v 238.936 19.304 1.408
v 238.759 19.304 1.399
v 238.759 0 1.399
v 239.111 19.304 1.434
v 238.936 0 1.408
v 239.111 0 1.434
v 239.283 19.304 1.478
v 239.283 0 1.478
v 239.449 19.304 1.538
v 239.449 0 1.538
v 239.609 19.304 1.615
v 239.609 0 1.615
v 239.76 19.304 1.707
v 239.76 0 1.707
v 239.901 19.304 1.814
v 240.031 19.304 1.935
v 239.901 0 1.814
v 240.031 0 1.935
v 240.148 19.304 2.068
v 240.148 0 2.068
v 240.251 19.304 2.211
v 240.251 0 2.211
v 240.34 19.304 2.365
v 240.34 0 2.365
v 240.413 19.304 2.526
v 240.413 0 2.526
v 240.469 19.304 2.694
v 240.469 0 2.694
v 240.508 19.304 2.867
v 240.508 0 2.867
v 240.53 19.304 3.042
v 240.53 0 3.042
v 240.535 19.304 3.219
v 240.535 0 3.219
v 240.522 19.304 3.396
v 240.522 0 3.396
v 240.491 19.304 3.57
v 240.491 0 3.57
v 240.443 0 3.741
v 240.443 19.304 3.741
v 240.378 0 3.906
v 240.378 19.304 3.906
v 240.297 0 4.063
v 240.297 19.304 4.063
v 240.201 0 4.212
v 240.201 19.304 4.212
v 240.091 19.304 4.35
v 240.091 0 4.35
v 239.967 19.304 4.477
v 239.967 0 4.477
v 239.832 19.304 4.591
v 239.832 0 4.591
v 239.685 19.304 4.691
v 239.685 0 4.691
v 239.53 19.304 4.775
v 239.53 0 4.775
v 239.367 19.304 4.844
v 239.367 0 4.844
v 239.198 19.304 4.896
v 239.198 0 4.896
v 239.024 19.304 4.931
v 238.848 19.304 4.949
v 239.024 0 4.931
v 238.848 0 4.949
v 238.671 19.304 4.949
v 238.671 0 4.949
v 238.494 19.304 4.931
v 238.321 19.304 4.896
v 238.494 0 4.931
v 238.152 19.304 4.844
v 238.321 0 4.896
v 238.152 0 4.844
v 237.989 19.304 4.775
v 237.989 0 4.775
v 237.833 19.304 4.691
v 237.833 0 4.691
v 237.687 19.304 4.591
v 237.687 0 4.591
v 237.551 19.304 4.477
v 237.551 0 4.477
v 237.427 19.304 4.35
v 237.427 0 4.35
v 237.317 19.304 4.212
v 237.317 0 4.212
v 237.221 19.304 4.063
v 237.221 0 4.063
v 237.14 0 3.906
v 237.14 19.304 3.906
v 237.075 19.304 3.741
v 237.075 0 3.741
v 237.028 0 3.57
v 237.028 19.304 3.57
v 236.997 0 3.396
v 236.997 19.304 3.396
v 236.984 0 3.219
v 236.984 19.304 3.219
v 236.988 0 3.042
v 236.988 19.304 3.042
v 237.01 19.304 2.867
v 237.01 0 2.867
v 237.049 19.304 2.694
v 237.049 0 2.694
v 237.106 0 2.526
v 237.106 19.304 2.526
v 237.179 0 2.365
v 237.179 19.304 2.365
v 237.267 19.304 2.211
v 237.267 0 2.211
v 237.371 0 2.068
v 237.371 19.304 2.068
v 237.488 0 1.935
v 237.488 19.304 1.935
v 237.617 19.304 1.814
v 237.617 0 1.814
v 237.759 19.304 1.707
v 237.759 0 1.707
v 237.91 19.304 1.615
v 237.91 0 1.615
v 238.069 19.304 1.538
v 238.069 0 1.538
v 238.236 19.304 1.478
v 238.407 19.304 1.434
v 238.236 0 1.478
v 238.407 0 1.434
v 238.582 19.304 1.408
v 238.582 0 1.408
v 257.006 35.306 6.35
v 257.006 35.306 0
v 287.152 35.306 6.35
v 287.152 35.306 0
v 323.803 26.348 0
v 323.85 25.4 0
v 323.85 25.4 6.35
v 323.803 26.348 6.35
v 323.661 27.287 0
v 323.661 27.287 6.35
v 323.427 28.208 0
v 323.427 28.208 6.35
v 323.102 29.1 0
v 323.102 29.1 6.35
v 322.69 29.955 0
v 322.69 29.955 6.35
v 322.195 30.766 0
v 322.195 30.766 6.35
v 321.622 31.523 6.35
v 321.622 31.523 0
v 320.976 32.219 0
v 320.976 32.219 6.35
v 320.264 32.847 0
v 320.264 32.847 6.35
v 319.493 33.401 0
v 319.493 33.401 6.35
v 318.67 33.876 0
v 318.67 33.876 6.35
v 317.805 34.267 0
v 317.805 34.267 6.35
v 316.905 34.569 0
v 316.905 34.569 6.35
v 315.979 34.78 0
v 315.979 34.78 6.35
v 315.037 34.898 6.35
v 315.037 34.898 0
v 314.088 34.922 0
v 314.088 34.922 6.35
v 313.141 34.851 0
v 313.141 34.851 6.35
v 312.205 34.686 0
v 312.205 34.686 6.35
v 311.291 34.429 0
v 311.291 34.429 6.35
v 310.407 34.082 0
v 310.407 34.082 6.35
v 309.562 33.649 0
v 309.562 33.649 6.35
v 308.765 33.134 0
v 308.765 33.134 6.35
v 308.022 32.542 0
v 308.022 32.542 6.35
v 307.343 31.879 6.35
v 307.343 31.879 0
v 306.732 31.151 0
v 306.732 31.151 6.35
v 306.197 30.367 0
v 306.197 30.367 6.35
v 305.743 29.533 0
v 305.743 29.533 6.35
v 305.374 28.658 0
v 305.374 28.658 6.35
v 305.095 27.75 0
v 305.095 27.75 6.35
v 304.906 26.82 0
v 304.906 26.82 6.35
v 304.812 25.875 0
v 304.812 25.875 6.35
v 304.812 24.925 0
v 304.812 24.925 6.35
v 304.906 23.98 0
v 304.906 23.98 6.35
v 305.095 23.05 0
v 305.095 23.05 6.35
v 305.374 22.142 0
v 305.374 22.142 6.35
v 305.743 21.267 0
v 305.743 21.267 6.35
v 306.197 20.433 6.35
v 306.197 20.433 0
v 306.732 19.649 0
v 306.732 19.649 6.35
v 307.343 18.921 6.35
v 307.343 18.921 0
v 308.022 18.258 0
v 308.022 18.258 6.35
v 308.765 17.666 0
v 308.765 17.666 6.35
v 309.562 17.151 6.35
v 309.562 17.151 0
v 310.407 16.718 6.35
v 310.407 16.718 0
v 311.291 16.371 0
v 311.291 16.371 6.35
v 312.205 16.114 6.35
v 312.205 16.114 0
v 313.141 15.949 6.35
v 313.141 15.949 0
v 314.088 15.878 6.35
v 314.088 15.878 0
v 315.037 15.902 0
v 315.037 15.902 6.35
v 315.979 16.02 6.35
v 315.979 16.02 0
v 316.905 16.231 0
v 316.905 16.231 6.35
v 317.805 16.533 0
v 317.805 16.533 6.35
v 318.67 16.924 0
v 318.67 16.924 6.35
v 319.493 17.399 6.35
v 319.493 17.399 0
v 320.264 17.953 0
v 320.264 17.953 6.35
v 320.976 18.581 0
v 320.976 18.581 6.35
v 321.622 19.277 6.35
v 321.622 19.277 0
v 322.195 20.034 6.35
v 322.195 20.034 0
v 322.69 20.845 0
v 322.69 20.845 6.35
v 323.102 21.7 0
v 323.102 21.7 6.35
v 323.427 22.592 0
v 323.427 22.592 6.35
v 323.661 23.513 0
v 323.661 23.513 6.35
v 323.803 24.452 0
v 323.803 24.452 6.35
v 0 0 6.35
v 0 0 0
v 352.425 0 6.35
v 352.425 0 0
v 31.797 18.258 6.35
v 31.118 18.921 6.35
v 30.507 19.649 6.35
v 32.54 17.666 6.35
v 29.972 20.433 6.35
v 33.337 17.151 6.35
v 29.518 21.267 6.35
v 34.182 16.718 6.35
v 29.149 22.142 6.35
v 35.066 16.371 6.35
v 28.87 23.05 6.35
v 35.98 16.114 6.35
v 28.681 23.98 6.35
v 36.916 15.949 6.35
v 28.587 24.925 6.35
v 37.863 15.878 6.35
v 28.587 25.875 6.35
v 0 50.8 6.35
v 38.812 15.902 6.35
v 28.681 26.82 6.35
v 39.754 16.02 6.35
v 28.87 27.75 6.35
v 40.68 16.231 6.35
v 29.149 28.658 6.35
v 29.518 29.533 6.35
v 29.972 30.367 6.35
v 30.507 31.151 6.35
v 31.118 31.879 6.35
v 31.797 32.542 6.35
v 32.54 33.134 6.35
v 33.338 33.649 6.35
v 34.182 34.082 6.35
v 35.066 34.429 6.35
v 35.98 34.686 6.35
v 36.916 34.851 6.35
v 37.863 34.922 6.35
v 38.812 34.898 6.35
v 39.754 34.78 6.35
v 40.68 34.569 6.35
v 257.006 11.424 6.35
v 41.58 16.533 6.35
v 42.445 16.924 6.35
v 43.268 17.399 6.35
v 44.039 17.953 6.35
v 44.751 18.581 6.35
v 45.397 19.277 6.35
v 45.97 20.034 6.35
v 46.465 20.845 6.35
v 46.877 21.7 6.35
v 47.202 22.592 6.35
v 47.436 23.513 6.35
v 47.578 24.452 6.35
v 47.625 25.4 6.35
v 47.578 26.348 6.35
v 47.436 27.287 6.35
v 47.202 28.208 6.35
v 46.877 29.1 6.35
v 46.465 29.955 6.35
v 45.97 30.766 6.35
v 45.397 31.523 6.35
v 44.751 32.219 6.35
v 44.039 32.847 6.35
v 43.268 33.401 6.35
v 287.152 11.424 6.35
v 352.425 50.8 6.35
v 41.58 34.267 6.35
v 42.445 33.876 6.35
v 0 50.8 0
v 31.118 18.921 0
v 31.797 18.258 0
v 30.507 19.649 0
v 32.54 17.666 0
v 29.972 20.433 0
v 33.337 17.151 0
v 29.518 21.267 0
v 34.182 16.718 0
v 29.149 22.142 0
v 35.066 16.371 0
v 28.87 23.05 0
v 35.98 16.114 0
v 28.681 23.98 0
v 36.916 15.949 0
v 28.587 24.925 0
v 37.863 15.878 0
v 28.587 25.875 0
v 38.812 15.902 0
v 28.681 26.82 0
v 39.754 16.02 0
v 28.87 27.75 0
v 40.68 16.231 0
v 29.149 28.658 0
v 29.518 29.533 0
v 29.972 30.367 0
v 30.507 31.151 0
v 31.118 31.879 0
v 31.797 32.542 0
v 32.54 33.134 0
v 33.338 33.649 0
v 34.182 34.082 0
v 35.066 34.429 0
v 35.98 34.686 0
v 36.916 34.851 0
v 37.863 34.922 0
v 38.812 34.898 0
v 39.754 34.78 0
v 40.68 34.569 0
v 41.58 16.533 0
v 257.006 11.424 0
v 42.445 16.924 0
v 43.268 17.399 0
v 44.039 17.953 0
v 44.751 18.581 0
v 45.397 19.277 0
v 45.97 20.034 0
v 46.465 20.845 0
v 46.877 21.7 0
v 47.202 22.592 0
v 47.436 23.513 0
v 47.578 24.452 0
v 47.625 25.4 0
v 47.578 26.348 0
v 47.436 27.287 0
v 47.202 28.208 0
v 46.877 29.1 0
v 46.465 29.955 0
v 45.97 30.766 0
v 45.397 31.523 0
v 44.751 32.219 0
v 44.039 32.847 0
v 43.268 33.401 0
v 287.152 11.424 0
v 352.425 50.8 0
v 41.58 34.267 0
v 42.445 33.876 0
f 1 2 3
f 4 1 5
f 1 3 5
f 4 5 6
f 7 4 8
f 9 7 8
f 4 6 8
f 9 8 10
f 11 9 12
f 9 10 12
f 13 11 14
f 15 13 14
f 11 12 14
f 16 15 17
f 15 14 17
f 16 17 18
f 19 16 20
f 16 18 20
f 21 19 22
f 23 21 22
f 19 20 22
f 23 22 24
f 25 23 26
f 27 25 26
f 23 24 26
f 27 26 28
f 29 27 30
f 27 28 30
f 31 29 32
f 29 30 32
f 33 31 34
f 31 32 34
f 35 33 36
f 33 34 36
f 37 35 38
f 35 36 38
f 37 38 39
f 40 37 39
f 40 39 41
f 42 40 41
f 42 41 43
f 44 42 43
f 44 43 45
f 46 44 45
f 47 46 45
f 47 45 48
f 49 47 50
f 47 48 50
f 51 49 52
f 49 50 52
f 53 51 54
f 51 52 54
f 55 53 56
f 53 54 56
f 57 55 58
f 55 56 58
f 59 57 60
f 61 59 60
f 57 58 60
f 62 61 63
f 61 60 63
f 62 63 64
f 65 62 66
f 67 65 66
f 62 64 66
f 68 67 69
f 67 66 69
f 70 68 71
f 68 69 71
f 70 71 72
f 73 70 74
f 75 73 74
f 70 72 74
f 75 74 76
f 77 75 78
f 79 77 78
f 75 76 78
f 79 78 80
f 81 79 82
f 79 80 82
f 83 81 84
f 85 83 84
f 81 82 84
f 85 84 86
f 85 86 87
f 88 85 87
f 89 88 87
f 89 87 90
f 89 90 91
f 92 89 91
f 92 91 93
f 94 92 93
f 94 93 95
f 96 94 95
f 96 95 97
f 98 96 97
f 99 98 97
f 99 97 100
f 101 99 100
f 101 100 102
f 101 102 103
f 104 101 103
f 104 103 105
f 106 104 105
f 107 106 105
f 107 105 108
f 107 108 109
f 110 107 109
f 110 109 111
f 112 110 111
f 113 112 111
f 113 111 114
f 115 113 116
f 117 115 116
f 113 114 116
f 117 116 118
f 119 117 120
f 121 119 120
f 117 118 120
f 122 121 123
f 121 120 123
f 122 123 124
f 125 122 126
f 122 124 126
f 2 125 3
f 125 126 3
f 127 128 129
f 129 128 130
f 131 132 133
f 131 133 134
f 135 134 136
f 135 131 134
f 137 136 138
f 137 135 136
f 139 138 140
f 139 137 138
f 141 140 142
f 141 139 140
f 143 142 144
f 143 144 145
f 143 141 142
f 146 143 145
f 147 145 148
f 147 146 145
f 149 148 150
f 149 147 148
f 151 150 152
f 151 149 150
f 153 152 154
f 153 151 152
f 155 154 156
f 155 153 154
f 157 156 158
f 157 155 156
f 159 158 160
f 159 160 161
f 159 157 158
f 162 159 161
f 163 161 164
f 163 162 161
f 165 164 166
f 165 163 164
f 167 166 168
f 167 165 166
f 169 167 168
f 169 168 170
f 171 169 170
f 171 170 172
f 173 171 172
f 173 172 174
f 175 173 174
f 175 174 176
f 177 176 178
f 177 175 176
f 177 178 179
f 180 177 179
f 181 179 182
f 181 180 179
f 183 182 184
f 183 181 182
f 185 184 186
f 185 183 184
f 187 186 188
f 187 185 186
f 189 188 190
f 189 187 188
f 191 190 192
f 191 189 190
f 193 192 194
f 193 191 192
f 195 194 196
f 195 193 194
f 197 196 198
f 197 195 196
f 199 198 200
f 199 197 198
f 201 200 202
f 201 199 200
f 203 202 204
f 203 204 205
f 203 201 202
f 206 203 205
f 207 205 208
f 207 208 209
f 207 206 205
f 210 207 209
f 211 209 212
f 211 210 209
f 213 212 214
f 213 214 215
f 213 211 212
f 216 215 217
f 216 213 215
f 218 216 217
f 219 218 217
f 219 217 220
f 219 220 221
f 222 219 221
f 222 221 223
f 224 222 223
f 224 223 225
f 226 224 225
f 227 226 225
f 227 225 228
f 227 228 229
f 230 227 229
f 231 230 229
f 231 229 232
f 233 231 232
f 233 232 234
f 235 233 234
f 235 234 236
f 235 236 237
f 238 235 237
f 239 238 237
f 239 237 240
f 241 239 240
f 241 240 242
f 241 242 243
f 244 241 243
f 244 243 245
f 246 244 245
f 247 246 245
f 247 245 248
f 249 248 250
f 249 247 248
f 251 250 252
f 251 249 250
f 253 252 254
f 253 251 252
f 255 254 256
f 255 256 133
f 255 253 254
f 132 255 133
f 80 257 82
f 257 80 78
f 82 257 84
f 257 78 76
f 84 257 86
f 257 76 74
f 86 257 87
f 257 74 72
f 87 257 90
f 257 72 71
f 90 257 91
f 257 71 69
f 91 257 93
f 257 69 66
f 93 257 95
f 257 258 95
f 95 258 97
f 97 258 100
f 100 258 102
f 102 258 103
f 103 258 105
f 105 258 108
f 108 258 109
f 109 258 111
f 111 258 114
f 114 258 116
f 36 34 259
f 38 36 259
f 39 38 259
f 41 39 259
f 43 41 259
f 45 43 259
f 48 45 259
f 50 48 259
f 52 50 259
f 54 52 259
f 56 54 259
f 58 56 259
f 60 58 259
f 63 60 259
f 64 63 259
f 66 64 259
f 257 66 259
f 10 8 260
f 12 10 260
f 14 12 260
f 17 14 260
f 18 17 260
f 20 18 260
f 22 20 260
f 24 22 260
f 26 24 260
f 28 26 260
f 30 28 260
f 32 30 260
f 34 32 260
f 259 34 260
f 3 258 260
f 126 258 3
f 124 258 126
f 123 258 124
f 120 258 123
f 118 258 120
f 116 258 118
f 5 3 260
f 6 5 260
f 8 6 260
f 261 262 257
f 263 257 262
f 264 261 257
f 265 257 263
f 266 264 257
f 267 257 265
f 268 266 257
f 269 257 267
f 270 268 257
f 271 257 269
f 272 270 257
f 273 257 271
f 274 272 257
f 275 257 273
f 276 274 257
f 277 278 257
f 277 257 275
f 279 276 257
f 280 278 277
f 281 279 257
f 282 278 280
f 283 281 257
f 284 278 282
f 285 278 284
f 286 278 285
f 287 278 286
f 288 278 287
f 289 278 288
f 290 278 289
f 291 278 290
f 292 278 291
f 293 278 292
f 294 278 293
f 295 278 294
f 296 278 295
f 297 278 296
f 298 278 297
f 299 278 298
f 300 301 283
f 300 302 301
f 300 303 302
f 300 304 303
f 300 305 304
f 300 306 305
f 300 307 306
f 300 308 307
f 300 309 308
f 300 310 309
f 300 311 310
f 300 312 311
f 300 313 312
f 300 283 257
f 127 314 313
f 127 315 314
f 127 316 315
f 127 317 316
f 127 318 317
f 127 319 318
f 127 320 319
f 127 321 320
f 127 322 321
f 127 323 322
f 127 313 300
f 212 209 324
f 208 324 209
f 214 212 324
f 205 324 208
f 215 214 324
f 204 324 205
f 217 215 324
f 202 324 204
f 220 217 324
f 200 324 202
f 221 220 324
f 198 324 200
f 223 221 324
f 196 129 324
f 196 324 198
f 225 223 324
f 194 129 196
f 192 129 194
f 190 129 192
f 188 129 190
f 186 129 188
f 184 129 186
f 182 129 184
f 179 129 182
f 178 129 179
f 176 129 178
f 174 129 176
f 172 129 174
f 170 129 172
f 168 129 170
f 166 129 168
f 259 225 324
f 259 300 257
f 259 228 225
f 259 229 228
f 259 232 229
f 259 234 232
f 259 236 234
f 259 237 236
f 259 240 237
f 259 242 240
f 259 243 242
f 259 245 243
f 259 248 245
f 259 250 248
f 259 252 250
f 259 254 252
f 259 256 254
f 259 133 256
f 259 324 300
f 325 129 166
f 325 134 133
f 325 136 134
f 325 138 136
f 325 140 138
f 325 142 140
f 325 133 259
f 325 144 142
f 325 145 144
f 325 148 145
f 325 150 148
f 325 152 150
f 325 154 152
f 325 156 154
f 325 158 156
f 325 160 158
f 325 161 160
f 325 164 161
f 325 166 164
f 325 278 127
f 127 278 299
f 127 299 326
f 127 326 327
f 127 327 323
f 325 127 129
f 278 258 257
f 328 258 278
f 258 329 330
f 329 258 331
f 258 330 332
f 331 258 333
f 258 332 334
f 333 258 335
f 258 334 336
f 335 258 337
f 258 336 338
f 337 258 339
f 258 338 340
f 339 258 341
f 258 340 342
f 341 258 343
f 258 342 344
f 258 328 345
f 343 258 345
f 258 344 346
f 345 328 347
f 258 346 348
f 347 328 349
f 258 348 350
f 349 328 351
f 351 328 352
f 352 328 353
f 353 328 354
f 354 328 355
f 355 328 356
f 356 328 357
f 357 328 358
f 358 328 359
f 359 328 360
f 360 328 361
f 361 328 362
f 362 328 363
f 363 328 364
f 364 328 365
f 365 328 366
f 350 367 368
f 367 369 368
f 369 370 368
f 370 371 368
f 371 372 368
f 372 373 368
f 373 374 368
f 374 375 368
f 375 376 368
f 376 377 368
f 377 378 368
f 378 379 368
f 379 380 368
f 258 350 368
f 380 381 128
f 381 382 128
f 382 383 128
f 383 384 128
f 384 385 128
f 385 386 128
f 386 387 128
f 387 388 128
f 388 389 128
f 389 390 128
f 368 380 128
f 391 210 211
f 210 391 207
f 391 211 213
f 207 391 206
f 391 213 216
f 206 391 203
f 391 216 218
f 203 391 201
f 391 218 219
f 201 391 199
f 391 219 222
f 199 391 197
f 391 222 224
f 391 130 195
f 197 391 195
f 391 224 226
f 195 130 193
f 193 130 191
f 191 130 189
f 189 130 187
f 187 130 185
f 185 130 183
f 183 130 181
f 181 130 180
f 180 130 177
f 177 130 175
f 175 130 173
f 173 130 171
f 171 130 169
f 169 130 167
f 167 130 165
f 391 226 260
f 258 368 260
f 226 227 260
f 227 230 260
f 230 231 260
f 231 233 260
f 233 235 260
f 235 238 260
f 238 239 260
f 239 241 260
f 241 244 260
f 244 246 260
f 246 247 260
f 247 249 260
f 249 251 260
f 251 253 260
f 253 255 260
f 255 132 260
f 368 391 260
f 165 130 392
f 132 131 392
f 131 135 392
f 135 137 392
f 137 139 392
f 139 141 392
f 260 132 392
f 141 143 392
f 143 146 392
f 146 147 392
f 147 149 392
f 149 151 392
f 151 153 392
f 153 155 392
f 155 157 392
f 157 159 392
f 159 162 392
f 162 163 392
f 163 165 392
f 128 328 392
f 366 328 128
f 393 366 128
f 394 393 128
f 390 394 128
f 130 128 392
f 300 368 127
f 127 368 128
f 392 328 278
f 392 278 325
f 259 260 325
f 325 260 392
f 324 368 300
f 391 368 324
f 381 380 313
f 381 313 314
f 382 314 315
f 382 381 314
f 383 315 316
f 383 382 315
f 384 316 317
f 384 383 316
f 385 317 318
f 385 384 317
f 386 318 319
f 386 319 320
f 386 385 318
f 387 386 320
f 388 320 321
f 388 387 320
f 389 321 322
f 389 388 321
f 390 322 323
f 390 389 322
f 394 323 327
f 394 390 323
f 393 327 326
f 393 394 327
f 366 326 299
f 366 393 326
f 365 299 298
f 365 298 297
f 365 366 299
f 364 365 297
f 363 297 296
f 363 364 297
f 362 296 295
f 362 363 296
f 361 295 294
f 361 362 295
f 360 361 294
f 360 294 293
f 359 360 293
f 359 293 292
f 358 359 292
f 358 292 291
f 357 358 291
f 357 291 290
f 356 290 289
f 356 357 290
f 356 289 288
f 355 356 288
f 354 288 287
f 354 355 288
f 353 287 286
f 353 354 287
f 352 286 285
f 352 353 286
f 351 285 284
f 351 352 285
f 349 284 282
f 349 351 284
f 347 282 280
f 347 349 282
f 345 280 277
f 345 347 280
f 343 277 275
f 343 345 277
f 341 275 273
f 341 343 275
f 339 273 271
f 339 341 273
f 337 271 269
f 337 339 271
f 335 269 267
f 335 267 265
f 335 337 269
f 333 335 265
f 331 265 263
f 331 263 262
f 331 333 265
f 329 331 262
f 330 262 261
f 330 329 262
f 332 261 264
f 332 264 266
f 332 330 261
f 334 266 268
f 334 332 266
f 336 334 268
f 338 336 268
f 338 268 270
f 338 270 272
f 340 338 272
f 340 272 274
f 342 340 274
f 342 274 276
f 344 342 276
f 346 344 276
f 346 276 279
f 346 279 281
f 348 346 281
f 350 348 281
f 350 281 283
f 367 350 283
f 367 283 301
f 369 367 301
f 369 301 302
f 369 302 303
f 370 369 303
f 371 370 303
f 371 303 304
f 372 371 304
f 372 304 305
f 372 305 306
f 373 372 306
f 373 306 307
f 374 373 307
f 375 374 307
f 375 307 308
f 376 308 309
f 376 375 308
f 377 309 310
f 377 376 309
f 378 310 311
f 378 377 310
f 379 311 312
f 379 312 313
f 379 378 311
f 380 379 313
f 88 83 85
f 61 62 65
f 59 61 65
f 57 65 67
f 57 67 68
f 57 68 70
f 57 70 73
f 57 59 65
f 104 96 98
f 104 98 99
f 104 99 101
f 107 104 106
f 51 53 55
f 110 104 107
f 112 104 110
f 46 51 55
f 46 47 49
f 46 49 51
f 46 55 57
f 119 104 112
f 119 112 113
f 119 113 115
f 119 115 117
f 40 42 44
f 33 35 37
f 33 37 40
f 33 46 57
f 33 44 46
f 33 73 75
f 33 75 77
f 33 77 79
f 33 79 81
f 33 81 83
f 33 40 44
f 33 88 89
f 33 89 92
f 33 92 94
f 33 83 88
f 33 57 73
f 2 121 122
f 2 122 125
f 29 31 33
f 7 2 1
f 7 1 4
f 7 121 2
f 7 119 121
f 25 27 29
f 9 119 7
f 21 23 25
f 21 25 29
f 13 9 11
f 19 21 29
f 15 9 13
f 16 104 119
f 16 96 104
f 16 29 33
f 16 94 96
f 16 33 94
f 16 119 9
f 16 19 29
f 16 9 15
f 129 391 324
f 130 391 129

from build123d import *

# Parameters (mm, degrees)
SKETCH1_W           = 352.425
SKETCH1_H           = 50.8
SKETCH1_R           = 9.525
SKETCH1_W_2         = 30.145810139
SKETCH1_H_2         = 23.882232645
BOSS_EXTRUDE1_DEPTH = 6.35
SKETCH2_R           = 1.776231012
CUT_EXTRUDE1_DEPTH  = 19.304


with BuildPart() as part:
    # Sketch1 → Boss-Extrude1 (new body)
    with BuildSketch(Plane.XY):
        with Locations((176.2125, 25.4)):
            Rectangle(SKETCH1_W, SKETCH1_H)
        with Locations((38.1, 25.4)):
            Circle(SKETCH1_R, mode=Mode.SUBTRACT)
        with Locations((314.325, 25.4)):
            Circle(SKETCH1_R, mode=Mode.SUBTRACT)
        with Locations((272.079290139, 23.364723209)):
            Rectangle(SKETCH1_W_2, SKETCH1_H_2, mode=Mode.SUBTRACT)
    extrude(amount=BOSS_EXTRUDE1_DEPTH)

    # Sketch2 → Cut-Extrude1 (cut)
    with BuildSketch(Plane.XZ):
        with Locations(Location((238.759223147, 3.175, 0), (0, 0, 270))):
            Circle(SKETCH2_R)
    extrude(amount=-CUT_EXTRUDE1_DEPTH, mode=Mode.SUBTRACT)


solid = part.part
